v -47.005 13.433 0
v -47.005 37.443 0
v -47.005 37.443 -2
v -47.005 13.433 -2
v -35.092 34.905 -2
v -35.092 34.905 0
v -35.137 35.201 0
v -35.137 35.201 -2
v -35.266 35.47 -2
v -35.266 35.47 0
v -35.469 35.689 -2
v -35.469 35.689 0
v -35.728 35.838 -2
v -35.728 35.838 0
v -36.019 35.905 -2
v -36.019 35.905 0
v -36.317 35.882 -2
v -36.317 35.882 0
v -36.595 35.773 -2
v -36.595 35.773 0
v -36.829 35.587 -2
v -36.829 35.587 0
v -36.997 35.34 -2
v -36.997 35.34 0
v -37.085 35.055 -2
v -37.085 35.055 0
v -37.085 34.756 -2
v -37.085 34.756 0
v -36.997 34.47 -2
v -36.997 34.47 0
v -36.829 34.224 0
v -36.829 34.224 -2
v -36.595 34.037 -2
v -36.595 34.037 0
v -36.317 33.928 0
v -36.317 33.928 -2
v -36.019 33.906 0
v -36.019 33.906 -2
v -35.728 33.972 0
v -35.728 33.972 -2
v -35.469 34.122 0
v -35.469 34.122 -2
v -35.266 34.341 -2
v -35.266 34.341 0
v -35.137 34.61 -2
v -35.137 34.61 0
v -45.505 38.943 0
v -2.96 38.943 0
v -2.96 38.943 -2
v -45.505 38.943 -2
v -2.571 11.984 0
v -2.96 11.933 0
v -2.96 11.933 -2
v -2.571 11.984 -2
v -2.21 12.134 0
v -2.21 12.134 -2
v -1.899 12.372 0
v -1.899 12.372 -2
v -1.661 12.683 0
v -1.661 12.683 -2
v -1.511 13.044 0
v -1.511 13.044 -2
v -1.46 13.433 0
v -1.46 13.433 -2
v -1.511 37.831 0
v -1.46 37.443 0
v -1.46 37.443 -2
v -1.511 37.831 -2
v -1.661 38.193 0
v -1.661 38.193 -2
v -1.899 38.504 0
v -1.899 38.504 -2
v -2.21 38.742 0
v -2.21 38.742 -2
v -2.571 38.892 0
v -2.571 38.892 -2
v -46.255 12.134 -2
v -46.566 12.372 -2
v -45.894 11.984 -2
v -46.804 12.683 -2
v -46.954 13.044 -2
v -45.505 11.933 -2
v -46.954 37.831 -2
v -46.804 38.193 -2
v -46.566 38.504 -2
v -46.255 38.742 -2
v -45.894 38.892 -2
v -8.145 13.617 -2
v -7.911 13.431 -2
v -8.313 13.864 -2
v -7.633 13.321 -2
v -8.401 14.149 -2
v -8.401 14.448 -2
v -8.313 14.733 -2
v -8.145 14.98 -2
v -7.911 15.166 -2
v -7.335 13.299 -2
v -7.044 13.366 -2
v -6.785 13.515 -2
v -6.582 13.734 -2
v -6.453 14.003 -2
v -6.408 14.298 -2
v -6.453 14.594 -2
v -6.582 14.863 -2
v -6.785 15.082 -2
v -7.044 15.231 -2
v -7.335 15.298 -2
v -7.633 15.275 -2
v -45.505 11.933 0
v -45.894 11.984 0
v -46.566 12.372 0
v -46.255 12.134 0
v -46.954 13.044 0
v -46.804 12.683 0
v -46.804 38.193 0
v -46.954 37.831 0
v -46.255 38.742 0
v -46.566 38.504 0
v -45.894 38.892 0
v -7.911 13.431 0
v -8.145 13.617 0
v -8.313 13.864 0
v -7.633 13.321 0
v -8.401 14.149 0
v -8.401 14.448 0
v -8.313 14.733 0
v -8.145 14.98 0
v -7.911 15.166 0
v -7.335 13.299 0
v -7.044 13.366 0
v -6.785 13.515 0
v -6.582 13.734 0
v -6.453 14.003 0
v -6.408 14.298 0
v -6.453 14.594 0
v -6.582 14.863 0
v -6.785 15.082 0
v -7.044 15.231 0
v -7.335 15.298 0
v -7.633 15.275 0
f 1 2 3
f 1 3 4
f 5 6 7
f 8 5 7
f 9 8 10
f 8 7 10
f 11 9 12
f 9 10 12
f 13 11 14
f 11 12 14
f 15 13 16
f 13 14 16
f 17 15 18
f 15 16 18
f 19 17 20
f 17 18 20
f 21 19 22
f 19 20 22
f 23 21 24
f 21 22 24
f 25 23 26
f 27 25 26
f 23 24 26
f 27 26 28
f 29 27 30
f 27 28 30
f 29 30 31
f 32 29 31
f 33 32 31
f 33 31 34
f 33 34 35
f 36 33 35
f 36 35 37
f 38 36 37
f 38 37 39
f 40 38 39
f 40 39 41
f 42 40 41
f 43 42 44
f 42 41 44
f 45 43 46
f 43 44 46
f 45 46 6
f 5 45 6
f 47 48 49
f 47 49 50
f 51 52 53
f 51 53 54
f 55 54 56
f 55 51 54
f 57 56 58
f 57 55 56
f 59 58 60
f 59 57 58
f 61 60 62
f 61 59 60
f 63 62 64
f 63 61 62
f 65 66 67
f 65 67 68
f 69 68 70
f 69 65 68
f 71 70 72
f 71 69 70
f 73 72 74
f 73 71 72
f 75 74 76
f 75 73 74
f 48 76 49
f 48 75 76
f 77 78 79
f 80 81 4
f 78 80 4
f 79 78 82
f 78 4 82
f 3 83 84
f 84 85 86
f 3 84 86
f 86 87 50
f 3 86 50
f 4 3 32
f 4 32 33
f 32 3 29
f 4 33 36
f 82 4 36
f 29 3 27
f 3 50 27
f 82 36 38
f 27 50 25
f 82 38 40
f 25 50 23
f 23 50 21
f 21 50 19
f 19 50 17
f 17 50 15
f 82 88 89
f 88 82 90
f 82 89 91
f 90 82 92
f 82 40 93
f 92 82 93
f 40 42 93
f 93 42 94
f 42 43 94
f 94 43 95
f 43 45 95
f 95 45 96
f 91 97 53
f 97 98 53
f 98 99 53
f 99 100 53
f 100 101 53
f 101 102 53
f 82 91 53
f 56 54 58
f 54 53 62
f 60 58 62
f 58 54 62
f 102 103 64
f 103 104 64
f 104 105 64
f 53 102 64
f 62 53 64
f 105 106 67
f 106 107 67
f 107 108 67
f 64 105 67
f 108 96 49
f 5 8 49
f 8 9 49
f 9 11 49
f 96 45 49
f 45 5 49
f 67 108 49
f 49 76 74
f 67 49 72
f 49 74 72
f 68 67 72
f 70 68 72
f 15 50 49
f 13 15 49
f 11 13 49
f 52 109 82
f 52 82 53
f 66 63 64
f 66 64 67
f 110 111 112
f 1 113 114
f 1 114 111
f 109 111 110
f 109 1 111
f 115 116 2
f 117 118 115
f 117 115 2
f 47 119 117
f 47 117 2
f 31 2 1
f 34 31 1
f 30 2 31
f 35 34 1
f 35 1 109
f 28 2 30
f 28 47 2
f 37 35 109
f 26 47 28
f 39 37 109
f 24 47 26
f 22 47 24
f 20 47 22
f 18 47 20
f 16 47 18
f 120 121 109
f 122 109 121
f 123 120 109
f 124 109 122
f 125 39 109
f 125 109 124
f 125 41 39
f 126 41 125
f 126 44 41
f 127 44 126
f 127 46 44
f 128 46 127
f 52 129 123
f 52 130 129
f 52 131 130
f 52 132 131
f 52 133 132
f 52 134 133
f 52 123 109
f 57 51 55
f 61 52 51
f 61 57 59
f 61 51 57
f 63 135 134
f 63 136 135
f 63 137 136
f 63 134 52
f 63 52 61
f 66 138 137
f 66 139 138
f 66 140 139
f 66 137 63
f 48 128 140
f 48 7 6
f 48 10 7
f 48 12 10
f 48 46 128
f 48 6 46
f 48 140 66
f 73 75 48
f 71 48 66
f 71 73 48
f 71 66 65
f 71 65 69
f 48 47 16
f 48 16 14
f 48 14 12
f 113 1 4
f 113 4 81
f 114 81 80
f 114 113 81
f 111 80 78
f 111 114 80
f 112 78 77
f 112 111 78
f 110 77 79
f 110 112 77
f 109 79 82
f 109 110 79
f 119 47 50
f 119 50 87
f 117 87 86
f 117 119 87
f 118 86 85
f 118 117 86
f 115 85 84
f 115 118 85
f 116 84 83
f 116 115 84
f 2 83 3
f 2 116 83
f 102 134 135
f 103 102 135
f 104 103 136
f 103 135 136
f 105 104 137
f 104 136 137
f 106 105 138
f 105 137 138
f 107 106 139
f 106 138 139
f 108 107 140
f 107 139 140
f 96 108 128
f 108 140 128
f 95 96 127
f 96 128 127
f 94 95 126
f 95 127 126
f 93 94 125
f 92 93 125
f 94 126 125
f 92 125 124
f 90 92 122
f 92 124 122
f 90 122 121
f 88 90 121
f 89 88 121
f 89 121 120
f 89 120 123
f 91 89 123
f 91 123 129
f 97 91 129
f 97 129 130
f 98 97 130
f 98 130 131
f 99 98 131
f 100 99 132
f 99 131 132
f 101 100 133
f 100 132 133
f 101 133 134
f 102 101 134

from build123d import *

# Parameters (mm, degrees)
SKETCH1_R           = 1.002175573
BOSS_EXTRUDE1_DEPTH = 2


with BuildPart() as part:
    # Sketch1 → Boss-Extrude1 (new body)
    with BuildSketch(Plane.XY):
        with BuildLine():
            Line((-45.505390048, 11.932639401), (-2.959655608, 11.932639401))
            ThreePointArc((-2.959655608, 11.932639401), (-1.898995436, 12.371979229), (-1.459655608, 13.432639401))
            Line((-1.459655608, 13.432639401), (-1.459655608, 37.443224784))
            ThreePointArc((-1.459655608, 37.443224784), (-1.898995436, 38.503884956), (-2.959655608, 38.943224784))
            Line((-2.959655608, 38.943224784), (-45.505390048, 38.943224784))
            ThreePointArc((-45.505390048, 38.943224784), (-46.56605022, 38.503884956), (-47.005390048, 37.443224784))
            Line((-47.005390048, 37.443224784), (-47.005390048, 13.432639401))
            ThreePointArc((-47.005390048, 13.432639401), (-46.56605022, 12.371979229), (-45.505390048, 11.932639401))
        make_face()
        with Locations((-36.094331879, 34.905234601)):
            Circle(SKETCH1_R, mode=Mode.SUBTRACT)
        with Locations((-7.410237048, 14.298412667)):
            Circle(SKETCH1_R, mode=Mode.SUBTRACT)
    extrude(amount=-BOSS_EXTRUDE1_DEPTH)


solid = part.part
